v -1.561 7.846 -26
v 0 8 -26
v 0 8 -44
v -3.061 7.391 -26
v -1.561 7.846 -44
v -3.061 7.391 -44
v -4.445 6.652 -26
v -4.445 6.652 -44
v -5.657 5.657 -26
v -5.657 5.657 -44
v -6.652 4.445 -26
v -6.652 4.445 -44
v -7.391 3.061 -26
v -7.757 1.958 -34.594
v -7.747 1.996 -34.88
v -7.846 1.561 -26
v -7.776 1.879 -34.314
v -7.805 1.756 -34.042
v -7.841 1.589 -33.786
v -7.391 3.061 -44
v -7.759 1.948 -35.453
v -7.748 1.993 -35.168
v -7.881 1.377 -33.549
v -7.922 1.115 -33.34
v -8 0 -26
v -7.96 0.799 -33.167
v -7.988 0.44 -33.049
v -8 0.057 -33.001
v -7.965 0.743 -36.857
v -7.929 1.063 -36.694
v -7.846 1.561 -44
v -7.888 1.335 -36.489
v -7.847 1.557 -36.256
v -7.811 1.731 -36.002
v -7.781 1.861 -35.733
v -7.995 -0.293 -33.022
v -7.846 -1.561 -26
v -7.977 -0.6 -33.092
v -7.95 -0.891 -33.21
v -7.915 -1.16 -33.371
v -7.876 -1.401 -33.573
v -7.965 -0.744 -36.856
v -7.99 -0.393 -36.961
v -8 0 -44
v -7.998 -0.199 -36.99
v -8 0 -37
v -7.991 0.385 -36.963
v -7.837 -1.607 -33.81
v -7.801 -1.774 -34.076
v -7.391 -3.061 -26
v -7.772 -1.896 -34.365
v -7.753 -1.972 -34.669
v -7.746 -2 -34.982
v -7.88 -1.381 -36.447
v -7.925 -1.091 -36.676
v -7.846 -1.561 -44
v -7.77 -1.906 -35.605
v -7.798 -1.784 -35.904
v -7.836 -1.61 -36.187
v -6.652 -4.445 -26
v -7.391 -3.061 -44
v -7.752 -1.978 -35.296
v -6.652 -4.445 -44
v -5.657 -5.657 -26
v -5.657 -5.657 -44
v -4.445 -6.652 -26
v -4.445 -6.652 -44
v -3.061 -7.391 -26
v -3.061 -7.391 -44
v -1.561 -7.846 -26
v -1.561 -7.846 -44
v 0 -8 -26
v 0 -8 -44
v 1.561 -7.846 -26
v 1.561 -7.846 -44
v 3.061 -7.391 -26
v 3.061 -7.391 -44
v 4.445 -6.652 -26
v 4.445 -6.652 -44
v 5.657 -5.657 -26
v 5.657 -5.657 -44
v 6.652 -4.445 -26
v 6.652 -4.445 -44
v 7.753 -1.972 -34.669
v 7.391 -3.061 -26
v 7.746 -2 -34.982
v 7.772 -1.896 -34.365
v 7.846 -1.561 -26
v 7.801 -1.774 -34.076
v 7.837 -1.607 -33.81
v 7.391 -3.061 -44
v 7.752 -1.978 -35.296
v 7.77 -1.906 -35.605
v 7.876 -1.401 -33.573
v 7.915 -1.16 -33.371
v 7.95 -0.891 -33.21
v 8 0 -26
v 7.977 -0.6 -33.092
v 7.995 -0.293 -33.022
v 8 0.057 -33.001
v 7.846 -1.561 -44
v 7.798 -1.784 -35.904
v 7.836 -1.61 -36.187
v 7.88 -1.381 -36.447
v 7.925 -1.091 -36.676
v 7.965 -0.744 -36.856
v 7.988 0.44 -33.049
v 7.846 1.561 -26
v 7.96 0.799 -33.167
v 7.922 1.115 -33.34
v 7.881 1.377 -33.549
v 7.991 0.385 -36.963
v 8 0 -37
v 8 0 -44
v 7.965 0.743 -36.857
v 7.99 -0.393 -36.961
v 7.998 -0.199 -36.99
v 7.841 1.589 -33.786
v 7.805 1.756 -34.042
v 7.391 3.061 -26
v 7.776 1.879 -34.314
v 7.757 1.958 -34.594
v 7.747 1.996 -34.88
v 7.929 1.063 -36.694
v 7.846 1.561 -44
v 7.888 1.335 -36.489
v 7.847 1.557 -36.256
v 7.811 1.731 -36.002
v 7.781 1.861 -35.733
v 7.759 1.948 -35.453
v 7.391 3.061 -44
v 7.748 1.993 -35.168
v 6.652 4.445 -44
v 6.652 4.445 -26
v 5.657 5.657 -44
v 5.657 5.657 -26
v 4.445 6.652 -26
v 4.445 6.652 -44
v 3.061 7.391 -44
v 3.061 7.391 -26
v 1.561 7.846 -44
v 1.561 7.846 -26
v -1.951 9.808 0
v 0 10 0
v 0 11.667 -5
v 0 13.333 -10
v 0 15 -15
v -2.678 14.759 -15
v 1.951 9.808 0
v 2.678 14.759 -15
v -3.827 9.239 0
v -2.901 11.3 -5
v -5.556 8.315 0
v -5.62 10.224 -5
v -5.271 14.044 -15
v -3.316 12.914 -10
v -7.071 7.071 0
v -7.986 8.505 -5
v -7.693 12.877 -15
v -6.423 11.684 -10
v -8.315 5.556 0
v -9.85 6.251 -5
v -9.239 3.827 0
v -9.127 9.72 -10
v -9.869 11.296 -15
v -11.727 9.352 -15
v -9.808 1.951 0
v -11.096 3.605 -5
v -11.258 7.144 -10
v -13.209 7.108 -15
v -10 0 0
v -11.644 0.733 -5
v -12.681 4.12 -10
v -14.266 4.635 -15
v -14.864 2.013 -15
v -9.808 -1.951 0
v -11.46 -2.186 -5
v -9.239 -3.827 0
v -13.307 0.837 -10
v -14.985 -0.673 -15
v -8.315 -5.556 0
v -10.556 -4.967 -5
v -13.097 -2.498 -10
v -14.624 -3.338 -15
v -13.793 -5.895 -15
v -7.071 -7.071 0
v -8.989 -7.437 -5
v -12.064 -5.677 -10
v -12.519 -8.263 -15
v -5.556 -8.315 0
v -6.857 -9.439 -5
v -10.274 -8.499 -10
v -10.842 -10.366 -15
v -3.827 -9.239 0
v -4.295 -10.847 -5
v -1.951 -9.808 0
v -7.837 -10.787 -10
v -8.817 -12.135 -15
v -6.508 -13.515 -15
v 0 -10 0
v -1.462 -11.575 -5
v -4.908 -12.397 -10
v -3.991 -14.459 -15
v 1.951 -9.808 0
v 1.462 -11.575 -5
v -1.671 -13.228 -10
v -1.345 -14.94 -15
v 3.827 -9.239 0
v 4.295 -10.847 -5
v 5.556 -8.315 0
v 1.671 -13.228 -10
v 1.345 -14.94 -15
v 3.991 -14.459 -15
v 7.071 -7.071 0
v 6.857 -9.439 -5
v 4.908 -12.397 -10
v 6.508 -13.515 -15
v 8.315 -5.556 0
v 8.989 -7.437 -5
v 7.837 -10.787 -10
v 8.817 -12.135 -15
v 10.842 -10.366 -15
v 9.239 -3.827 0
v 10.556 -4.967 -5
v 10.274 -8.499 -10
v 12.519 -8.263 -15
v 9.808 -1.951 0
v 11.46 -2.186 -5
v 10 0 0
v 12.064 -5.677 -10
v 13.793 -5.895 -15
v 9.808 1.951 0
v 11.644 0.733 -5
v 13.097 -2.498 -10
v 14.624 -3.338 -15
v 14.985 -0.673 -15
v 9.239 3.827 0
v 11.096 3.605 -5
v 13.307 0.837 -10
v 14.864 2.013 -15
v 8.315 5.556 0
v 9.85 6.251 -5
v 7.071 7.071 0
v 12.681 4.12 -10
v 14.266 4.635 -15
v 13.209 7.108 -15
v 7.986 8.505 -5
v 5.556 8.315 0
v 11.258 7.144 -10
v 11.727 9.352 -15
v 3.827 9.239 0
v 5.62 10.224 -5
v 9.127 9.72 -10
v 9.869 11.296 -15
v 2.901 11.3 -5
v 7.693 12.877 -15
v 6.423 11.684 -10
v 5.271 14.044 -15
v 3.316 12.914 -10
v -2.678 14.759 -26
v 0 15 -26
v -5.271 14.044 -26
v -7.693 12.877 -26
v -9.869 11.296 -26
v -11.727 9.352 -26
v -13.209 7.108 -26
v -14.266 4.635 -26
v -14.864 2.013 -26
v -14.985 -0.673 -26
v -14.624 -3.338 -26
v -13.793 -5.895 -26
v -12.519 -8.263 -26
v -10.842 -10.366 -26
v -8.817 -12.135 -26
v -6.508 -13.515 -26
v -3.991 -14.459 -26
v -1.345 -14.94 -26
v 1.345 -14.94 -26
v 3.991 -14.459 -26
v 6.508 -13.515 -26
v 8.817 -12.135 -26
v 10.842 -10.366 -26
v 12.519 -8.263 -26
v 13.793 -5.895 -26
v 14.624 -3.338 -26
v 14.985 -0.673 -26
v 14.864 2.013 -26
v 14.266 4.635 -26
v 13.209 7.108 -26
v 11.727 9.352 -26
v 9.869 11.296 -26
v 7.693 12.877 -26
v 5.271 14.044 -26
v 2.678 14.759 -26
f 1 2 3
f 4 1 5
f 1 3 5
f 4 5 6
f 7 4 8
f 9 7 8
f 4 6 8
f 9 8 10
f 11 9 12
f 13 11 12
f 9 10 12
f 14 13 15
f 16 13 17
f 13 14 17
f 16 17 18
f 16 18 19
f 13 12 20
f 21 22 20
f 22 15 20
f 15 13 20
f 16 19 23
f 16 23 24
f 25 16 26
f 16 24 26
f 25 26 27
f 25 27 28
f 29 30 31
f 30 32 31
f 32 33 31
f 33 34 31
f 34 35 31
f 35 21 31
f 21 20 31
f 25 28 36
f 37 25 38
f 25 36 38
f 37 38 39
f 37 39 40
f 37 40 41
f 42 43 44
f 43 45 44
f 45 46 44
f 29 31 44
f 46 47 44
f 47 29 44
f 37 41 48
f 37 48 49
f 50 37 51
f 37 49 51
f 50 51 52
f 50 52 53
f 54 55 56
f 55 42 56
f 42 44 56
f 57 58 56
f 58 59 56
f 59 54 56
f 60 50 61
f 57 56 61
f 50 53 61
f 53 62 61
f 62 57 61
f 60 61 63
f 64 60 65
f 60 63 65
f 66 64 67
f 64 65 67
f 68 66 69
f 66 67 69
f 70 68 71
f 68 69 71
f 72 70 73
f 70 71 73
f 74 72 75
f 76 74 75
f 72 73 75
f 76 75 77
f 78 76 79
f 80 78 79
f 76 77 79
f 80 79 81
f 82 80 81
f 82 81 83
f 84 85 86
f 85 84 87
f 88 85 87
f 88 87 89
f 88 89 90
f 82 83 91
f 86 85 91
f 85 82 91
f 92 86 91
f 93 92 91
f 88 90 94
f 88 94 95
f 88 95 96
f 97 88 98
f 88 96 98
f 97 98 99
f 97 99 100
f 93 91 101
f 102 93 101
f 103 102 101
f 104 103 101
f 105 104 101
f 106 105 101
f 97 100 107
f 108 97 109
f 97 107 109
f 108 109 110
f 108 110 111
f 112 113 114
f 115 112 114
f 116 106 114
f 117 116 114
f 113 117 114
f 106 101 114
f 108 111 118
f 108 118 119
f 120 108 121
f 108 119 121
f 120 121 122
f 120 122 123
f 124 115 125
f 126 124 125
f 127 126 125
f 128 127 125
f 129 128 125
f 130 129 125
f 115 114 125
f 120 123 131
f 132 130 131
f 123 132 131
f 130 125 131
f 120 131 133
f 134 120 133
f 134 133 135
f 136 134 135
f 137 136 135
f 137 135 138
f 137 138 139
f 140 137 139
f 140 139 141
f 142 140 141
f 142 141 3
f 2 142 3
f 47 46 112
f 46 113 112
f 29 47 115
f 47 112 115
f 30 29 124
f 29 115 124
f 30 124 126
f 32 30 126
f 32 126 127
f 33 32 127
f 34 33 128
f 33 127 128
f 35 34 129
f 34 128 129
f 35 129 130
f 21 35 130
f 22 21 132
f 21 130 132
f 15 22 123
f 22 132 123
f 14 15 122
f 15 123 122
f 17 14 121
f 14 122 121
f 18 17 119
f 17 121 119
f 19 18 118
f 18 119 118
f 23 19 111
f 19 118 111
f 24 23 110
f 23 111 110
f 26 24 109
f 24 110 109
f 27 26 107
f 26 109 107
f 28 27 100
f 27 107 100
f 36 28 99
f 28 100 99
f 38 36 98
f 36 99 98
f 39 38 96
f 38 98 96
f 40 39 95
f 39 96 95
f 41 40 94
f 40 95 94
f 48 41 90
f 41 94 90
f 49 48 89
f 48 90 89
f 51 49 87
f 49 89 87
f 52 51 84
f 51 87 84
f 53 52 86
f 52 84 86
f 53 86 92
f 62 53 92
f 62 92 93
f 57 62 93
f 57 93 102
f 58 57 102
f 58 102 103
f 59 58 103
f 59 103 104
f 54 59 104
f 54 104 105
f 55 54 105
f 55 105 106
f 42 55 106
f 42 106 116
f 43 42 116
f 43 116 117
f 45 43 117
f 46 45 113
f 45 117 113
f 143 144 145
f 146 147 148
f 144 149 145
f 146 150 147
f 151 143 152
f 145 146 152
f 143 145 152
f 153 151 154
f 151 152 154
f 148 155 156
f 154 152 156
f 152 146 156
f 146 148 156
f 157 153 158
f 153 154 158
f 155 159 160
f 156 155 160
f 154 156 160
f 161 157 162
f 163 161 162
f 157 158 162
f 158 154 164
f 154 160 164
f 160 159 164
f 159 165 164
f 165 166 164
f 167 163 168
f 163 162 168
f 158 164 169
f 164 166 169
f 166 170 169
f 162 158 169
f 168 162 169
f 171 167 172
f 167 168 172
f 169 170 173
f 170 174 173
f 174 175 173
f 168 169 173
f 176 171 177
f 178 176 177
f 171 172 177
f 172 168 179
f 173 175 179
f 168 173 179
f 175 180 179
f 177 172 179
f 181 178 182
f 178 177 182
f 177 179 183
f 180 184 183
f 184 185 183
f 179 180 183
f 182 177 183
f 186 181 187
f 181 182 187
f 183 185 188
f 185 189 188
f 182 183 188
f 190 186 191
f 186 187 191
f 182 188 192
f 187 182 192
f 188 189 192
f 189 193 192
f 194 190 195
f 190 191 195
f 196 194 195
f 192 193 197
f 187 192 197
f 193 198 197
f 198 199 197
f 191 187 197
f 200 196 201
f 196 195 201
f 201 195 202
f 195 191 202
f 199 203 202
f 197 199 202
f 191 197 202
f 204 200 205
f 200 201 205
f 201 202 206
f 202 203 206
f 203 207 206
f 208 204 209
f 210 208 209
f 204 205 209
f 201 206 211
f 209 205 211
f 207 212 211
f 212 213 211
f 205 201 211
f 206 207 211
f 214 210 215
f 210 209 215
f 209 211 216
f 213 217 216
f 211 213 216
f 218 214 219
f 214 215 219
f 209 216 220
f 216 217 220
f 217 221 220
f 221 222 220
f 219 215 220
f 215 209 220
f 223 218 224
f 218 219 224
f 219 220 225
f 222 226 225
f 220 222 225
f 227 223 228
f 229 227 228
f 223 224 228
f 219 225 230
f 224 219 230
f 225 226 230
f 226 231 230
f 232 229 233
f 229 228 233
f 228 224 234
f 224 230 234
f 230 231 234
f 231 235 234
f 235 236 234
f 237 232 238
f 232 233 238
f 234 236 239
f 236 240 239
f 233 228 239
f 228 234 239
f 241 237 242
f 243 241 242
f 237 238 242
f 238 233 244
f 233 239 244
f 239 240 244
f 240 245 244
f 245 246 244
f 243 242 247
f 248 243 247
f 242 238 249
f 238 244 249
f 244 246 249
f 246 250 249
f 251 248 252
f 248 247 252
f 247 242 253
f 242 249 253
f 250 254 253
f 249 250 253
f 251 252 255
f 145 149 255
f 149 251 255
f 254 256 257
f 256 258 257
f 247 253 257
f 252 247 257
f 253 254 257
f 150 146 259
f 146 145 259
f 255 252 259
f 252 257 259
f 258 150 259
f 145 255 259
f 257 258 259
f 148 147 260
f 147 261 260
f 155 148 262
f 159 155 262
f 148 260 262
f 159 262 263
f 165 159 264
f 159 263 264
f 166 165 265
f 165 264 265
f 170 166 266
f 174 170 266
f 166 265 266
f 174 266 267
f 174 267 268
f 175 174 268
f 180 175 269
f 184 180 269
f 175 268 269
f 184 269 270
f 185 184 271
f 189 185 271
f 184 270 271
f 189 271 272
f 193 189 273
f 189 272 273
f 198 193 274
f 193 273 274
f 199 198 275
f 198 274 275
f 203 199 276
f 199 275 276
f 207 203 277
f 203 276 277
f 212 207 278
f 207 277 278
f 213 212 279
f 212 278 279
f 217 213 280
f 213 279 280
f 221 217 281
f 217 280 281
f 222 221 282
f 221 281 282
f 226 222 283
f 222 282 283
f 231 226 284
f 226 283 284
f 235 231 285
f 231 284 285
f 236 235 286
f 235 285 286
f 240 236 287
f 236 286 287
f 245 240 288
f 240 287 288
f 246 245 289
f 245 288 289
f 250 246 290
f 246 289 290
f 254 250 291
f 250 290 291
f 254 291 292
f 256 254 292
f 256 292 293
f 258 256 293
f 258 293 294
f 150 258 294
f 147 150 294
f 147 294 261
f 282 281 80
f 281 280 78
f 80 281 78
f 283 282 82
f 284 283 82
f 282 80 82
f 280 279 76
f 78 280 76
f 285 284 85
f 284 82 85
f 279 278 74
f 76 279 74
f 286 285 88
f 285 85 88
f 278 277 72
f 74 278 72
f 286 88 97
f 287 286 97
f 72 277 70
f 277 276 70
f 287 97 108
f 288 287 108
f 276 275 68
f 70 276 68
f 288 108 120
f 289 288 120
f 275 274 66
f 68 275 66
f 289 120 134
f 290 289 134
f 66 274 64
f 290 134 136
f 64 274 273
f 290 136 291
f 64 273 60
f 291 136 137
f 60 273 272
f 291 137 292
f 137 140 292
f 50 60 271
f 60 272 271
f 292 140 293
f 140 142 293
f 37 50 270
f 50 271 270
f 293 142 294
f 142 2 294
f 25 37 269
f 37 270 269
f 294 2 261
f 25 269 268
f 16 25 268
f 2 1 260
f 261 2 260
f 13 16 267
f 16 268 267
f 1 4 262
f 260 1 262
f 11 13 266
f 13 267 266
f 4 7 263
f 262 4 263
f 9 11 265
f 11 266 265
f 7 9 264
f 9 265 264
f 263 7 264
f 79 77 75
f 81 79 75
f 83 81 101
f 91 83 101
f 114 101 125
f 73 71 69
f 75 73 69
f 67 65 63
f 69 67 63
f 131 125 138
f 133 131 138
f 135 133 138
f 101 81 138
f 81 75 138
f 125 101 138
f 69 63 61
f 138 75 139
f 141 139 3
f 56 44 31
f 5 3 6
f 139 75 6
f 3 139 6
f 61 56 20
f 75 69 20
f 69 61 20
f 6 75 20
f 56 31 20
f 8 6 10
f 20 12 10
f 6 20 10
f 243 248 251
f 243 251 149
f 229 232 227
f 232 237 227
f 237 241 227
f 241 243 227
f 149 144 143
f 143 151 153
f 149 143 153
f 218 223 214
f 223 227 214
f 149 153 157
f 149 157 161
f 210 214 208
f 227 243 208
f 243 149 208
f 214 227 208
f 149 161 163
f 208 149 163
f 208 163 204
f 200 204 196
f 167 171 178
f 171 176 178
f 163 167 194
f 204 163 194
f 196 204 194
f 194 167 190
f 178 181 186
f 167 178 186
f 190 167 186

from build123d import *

# Parameters (mm, degrees)
SKETCH_2_R          = 2
CUT_EXTRUDE_1_DEPTH = 10


with BuildPart() as part:
    # 草圖1 → 旋轉1 (revolve)
    with BuildSketch(Plane(origin=(0, 0, 0), x_dir=(0, 0, -1), z_dir=(1, 0, 0))):
        Polygon((0, 0), (0, 10), (15, 15), (26, 15), (26, 8), (44, 8), (44, 0), align=None)
    revolve(axis=Axis((0, 0, -44), (0, 0, 1)))

    # 草圖2 → 除料-伸長1 (cut, symmetric)
    with BuildSketch(Plane(origin=(0, 0, 0), x_dir=(0, 0, -1), z_dir=(1, 0, 0))):
        with Locations((35, 0)):
            Circle(SKETCH_2_R)
    extrude(amount=CUT_EXTRUDE_1_DEPTH, both=True, mode=Mode.SUBTRACT)


solid = part.part
